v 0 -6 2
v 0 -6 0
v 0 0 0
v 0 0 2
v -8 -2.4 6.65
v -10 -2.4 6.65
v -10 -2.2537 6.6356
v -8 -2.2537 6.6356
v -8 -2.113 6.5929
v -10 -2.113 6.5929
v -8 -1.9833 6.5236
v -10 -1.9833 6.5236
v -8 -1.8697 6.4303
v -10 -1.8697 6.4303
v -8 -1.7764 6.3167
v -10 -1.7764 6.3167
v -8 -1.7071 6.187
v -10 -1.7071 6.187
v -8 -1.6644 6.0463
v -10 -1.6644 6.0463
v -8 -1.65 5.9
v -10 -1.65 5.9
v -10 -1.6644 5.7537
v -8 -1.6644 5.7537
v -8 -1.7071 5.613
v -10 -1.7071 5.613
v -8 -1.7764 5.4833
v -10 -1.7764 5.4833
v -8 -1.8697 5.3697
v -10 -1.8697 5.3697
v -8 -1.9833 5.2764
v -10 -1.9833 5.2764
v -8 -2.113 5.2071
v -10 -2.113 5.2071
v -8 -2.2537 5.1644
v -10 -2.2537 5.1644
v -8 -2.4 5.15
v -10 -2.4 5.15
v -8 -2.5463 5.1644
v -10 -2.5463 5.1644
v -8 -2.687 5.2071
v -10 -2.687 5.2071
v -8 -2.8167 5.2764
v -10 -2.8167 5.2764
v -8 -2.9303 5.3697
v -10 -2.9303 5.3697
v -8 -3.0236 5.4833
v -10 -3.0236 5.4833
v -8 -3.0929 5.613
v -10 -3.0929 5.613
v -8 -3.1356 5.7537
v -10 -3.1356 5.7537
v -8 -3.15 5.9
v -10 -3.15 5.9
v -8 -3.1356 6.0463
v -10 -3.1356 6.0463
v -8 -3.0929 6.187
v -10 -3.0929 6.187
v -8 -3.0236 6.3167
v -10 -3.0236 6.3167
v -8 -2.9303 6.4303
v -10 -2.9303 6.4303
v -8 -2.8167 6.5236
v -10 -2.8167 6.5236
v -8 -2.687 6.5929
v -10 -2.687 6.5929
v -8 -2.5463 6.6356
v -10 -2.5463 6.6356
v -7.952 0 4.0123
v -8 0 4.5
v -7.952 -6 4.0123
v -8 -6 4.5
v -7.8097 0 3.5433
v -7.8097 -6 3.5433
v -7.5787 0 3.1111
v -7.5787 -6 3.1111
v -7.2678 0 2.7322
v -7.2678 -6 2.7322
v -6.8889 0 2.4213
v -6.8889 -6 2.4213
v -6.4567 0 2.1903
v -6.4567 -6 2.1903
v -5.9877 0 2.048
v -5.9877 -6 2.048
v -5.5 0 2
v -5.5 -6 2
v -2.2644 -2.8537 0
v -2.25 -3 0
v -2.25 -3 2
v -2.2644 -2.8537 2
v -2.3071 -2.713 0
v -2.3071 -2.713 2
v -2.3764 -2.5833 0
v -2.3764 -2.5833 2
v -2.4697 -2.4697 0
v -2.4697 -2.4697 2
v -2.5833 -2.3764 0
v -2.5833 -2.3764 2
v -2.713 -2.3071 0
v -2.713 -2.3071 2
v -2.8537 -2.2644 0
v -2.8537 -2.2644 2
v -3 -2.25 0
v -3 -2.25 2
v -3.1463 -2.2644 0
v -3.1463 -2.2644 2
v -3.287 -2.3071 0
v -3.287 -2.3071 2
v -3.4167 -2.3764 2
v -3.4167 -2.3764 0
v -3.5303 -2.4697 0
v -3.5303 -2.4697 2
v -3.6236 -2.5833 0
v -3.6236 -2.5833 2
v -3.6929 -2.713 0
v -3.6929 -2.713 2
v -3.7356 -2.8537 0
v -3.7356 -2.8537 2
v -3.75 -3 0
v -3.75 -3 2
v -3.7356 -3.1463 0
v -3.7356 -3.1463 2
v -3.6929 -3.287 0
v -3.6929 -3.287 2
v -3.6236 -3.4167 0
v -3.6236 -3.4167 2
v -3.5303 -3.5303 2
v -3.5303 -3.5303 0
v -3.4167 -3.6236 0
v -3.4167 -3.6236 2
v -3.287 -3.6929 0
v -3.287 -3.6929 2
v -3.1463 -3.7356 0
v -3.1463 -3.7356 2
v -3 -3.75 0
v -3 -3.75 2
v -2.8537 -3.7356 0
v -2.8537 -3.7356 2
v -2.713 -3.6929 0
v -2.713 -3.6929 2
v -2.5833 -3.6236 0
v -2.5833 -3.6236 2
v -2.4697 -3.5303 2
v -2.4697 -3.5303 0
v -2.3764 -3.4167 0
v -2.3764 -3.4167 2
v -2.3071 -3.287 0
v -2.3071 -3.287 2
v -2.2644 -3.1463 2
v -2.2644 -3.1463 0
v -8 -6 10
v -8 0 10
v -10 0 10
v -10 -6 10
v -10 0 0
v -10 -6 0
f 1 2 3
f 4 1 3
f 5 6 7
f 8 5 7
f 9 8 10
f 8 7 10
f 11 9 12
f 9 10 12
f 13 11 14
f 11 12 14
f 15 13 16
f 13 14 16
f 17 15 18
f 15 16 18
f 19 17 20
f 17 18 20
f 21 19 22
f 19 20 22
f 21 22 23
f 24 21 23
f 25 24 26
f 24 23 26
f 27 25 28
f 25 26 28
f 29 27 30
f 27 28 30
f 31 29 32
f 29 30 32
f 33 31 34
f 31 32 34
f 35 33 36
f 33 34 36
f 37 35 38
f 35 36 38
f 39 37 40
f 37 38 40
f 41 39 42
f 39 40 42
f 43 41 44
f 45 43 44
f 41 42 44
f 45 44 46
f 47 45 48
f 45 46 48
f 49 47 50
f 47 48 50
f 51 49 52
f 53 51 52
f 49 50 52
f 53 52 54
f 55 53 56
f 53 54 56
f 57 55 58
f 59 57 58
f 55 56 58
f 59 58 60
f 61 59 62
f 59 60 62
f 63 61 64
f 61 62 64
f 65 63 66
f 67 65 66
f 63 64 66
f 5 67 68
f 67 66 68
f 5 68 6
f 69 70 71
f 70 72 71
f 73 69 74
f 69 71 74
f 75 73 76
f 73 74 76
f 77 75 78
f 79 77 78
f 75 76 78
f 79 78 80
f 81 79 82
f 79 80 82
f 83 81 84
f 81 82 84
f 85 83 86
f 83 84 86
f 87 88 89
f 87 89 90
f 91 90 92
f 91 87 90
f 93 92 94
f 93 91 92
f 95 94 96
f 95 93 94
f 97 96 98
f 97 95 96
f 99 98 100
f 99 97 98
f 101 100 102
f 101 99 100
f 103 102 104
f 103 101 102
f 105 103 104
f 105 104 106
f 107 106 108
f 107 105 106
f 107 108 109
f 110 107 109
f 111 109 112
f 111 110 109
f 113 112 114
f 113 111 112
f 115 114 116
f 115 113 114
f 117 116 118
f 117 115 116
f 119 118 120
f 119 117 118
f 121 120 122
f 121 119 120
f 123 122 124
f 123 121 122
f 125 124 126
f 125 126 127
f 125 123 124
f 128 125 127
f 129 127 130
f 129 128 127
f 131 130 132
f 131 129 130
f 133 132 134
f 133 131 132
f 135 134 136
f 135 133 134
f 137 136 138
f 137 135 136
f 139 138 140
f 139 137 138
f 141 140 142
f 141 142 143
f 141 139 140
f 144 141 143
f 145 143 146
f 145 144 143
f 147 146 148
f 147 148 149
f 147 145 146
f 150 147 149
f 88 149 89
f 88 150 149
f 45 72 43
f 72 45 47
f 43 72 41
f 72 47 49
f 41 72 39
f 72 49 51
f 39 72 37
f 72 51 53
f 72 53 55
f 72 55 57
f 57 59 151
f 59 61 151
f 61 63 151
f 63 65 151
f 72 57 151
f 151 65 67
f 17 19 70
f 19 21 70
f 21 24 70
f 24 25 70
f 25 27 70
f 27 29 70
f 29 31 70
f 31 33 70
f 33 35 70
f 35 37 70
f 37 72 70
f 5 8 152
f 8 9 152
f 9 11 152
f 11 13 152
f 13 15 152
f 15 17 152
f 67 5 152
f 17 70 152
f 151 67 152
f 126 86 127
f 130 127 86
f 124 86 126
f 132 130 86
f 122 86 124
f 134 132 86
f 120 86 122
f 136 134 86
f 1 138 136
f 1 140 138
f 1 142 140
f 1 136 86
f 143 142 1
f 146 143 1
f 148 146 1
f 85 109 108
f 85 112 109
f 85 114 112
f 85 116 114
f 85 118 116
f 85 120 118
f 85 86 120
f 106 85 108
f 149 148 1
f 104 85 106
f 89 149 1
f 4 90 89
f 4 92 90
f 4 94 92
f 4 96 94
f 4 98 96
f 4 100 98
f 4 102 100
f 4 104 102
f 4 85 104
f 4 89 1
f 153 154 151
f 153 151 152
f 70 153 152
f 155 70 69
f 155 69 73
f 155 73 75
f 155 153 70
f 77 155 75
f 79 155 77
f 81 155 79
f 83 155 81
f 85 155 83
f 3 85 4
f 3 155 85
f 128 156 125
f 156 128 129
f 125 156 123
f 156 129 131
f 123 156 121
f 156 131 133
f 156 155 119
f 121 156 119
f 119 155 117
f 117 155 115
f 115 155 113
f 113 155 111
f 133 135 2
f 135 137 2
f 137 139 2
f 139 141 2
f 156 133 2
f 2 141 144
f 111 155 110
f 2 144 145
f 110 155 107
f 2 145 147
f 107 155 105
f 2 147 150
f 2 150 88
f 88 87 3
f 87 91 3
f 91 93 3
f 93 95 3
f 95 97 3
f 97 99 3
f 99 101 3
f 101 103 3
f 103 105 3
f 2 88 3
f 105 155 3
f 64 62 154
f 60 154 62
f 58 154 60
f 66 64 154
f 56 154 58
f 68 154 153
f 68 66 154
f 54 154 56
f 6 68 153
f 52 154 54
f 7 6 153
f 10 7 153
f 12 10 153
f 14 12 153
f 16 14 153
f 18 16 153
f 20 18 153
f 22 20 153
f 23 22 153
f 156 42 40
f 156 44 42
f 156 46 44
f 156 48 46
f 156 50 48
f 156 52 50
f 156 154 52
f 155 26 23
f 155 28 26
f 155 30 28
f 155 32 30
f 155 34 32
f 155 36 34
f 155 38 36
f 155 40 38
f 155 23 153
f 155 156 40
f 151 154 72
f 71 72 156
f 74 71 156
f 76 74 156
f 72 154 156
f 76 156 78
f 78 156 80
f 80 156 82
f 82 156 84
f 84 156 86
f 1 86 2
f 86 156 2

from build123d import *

# Parameters (mm, degrees)
SKETCH1_W           = 10
SKETCH1_H           = 6
SKETCH1_R           = 0.75
BOSS_EXTRUDE1_DEPTH = 2
SKETCH2_W           = 10
SKETCH2_H           = 6
SKETCH2_R           = 0.75
BOSS_EXTRUDE2_DEPTH = 2
FILLET2_R           = 2.5


with BuildPart() as part:
    # Sketch1 → Boss-Extrude1 (new body)
    with BuildSketch(Plane.XY):
        with Locations((-5, -3)):
            Rectangle(SKETCH1_W, SKETCH1_H)
        with Locations((-3, -3)):
            Circle(SKETCH1_R, mode=Mode.SUBTRACT)
    extrude(amount=BOSS_EXTRUDE1_DEPTH)

    # Sketch2 → Boss-Extrude2 (add)
    with BuildSketch(Plane.ZY.offset(10)):
        with Locations((5, -3)):
            Rectangle(SKETCH2_W, SKETCH2_H)
        with Locations((5.9, -2.4)):
            Circle(SKETCH2_R, mode=Mode.SUBTRACT)
    extrude(amount=-BOSS_EXTRUDE2_DEPTH)

    # Fillet2
    fillet2_edges = [part.edges().sort_by_distance(p)[0] for p in [
        (-8, -3, 2),
    ]]
    fillet(fillet2_edges, radius=FILLET2_R)


solid = part.part
